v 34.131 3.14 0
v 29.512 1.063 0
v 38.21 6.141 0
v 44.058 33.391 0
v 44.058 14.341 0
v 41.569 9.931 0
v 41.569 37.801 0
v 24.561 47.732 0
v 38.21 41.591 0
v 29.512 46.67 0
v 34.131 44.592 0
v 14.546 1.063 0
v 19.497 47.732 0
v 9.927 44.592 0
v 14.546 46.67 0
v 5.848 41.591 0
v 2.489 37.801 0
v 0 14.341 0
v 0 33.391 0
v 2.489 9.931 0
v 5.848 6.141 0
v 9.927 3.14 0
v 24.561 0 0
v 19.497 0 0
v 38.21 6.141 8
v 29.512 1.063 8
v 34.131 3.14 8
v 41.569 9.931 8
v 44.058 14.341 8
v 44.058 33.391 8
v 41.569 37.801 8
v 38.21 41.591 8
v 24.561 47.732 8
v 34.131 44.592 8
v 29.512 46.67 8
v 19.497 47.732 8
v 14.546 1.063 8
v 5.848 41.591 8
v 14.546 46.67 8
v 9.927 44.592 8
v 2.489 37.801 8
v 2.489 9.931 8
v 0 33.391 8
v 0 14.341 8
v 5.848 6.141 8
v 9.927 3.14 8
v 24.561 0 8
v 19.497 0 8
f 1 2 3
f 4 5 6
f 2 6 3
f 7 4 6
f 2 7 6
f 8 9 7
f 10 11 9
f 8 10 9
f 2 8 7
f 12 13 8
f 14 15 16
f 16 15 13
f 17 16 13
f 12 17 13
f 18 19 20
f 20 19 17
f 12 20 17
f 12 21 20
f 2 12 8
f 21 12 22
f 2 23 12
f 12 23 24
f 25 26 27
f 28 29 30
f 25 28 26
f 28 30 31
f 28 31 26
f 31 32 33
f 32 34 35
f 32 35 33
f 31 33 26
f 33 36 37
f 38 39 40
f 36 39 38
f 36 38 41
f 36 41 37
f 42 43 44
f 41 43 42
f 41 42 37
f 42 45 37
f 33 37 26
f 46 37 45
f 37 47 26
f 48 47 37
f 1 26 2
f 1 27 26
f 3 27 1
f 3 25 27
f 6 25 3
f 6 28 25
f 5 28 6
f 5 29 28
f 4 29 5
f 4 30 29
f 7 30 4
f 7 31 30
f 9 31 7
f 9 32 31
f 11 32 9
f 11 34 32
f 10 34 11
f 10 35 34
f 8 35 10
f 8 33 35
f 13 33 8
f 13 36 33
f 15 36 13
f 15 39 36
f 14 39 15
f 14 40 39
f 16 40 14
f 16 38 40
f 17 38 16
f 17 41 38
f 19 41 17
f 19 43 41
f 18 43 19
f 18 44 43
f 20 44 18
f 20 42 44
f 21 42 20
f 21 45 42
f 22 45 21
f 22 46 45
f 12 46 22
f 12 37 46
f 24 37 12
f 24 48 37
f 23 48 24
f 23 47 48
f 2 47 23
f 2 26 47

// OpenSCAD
$fn = 32;

// ----------------------------------------------------------------------
// Flat adaptor: double_d, 8 mm thick
// ----------------------------------------------------------------------

// --- parameters (mm) ---
profile_height = 8;       // extrusion height
profile_points = 24;      // points of the closed outline

profile = [[44.058, 33.391], [41.569, 37.801], [38.21, 41.591], [34.131, 44.592], [29.512, 46.67], [24.561, 47.732], [19.497, 47.732], [14.546, 46.67], [9.927, 44.592], [5.848, 41.591], [2.489, 37.801], [0, 33.391], [0, 14.341], [2.489, 9.931], [5.848, 6.141], [9.927, 3.14], [14.546, 1.063], [19.497, 0], [24.561, 0], [29.512, 1.063], [34.131, 3.14], [38.21, 6.141], [41.569, 9.931], [44.058, 14.341]];  // single closed polygon, 24 points, counter clockwise

// --- the one profile operation ---
linear_extrude(height = profile_height) polygon(points = profile);
